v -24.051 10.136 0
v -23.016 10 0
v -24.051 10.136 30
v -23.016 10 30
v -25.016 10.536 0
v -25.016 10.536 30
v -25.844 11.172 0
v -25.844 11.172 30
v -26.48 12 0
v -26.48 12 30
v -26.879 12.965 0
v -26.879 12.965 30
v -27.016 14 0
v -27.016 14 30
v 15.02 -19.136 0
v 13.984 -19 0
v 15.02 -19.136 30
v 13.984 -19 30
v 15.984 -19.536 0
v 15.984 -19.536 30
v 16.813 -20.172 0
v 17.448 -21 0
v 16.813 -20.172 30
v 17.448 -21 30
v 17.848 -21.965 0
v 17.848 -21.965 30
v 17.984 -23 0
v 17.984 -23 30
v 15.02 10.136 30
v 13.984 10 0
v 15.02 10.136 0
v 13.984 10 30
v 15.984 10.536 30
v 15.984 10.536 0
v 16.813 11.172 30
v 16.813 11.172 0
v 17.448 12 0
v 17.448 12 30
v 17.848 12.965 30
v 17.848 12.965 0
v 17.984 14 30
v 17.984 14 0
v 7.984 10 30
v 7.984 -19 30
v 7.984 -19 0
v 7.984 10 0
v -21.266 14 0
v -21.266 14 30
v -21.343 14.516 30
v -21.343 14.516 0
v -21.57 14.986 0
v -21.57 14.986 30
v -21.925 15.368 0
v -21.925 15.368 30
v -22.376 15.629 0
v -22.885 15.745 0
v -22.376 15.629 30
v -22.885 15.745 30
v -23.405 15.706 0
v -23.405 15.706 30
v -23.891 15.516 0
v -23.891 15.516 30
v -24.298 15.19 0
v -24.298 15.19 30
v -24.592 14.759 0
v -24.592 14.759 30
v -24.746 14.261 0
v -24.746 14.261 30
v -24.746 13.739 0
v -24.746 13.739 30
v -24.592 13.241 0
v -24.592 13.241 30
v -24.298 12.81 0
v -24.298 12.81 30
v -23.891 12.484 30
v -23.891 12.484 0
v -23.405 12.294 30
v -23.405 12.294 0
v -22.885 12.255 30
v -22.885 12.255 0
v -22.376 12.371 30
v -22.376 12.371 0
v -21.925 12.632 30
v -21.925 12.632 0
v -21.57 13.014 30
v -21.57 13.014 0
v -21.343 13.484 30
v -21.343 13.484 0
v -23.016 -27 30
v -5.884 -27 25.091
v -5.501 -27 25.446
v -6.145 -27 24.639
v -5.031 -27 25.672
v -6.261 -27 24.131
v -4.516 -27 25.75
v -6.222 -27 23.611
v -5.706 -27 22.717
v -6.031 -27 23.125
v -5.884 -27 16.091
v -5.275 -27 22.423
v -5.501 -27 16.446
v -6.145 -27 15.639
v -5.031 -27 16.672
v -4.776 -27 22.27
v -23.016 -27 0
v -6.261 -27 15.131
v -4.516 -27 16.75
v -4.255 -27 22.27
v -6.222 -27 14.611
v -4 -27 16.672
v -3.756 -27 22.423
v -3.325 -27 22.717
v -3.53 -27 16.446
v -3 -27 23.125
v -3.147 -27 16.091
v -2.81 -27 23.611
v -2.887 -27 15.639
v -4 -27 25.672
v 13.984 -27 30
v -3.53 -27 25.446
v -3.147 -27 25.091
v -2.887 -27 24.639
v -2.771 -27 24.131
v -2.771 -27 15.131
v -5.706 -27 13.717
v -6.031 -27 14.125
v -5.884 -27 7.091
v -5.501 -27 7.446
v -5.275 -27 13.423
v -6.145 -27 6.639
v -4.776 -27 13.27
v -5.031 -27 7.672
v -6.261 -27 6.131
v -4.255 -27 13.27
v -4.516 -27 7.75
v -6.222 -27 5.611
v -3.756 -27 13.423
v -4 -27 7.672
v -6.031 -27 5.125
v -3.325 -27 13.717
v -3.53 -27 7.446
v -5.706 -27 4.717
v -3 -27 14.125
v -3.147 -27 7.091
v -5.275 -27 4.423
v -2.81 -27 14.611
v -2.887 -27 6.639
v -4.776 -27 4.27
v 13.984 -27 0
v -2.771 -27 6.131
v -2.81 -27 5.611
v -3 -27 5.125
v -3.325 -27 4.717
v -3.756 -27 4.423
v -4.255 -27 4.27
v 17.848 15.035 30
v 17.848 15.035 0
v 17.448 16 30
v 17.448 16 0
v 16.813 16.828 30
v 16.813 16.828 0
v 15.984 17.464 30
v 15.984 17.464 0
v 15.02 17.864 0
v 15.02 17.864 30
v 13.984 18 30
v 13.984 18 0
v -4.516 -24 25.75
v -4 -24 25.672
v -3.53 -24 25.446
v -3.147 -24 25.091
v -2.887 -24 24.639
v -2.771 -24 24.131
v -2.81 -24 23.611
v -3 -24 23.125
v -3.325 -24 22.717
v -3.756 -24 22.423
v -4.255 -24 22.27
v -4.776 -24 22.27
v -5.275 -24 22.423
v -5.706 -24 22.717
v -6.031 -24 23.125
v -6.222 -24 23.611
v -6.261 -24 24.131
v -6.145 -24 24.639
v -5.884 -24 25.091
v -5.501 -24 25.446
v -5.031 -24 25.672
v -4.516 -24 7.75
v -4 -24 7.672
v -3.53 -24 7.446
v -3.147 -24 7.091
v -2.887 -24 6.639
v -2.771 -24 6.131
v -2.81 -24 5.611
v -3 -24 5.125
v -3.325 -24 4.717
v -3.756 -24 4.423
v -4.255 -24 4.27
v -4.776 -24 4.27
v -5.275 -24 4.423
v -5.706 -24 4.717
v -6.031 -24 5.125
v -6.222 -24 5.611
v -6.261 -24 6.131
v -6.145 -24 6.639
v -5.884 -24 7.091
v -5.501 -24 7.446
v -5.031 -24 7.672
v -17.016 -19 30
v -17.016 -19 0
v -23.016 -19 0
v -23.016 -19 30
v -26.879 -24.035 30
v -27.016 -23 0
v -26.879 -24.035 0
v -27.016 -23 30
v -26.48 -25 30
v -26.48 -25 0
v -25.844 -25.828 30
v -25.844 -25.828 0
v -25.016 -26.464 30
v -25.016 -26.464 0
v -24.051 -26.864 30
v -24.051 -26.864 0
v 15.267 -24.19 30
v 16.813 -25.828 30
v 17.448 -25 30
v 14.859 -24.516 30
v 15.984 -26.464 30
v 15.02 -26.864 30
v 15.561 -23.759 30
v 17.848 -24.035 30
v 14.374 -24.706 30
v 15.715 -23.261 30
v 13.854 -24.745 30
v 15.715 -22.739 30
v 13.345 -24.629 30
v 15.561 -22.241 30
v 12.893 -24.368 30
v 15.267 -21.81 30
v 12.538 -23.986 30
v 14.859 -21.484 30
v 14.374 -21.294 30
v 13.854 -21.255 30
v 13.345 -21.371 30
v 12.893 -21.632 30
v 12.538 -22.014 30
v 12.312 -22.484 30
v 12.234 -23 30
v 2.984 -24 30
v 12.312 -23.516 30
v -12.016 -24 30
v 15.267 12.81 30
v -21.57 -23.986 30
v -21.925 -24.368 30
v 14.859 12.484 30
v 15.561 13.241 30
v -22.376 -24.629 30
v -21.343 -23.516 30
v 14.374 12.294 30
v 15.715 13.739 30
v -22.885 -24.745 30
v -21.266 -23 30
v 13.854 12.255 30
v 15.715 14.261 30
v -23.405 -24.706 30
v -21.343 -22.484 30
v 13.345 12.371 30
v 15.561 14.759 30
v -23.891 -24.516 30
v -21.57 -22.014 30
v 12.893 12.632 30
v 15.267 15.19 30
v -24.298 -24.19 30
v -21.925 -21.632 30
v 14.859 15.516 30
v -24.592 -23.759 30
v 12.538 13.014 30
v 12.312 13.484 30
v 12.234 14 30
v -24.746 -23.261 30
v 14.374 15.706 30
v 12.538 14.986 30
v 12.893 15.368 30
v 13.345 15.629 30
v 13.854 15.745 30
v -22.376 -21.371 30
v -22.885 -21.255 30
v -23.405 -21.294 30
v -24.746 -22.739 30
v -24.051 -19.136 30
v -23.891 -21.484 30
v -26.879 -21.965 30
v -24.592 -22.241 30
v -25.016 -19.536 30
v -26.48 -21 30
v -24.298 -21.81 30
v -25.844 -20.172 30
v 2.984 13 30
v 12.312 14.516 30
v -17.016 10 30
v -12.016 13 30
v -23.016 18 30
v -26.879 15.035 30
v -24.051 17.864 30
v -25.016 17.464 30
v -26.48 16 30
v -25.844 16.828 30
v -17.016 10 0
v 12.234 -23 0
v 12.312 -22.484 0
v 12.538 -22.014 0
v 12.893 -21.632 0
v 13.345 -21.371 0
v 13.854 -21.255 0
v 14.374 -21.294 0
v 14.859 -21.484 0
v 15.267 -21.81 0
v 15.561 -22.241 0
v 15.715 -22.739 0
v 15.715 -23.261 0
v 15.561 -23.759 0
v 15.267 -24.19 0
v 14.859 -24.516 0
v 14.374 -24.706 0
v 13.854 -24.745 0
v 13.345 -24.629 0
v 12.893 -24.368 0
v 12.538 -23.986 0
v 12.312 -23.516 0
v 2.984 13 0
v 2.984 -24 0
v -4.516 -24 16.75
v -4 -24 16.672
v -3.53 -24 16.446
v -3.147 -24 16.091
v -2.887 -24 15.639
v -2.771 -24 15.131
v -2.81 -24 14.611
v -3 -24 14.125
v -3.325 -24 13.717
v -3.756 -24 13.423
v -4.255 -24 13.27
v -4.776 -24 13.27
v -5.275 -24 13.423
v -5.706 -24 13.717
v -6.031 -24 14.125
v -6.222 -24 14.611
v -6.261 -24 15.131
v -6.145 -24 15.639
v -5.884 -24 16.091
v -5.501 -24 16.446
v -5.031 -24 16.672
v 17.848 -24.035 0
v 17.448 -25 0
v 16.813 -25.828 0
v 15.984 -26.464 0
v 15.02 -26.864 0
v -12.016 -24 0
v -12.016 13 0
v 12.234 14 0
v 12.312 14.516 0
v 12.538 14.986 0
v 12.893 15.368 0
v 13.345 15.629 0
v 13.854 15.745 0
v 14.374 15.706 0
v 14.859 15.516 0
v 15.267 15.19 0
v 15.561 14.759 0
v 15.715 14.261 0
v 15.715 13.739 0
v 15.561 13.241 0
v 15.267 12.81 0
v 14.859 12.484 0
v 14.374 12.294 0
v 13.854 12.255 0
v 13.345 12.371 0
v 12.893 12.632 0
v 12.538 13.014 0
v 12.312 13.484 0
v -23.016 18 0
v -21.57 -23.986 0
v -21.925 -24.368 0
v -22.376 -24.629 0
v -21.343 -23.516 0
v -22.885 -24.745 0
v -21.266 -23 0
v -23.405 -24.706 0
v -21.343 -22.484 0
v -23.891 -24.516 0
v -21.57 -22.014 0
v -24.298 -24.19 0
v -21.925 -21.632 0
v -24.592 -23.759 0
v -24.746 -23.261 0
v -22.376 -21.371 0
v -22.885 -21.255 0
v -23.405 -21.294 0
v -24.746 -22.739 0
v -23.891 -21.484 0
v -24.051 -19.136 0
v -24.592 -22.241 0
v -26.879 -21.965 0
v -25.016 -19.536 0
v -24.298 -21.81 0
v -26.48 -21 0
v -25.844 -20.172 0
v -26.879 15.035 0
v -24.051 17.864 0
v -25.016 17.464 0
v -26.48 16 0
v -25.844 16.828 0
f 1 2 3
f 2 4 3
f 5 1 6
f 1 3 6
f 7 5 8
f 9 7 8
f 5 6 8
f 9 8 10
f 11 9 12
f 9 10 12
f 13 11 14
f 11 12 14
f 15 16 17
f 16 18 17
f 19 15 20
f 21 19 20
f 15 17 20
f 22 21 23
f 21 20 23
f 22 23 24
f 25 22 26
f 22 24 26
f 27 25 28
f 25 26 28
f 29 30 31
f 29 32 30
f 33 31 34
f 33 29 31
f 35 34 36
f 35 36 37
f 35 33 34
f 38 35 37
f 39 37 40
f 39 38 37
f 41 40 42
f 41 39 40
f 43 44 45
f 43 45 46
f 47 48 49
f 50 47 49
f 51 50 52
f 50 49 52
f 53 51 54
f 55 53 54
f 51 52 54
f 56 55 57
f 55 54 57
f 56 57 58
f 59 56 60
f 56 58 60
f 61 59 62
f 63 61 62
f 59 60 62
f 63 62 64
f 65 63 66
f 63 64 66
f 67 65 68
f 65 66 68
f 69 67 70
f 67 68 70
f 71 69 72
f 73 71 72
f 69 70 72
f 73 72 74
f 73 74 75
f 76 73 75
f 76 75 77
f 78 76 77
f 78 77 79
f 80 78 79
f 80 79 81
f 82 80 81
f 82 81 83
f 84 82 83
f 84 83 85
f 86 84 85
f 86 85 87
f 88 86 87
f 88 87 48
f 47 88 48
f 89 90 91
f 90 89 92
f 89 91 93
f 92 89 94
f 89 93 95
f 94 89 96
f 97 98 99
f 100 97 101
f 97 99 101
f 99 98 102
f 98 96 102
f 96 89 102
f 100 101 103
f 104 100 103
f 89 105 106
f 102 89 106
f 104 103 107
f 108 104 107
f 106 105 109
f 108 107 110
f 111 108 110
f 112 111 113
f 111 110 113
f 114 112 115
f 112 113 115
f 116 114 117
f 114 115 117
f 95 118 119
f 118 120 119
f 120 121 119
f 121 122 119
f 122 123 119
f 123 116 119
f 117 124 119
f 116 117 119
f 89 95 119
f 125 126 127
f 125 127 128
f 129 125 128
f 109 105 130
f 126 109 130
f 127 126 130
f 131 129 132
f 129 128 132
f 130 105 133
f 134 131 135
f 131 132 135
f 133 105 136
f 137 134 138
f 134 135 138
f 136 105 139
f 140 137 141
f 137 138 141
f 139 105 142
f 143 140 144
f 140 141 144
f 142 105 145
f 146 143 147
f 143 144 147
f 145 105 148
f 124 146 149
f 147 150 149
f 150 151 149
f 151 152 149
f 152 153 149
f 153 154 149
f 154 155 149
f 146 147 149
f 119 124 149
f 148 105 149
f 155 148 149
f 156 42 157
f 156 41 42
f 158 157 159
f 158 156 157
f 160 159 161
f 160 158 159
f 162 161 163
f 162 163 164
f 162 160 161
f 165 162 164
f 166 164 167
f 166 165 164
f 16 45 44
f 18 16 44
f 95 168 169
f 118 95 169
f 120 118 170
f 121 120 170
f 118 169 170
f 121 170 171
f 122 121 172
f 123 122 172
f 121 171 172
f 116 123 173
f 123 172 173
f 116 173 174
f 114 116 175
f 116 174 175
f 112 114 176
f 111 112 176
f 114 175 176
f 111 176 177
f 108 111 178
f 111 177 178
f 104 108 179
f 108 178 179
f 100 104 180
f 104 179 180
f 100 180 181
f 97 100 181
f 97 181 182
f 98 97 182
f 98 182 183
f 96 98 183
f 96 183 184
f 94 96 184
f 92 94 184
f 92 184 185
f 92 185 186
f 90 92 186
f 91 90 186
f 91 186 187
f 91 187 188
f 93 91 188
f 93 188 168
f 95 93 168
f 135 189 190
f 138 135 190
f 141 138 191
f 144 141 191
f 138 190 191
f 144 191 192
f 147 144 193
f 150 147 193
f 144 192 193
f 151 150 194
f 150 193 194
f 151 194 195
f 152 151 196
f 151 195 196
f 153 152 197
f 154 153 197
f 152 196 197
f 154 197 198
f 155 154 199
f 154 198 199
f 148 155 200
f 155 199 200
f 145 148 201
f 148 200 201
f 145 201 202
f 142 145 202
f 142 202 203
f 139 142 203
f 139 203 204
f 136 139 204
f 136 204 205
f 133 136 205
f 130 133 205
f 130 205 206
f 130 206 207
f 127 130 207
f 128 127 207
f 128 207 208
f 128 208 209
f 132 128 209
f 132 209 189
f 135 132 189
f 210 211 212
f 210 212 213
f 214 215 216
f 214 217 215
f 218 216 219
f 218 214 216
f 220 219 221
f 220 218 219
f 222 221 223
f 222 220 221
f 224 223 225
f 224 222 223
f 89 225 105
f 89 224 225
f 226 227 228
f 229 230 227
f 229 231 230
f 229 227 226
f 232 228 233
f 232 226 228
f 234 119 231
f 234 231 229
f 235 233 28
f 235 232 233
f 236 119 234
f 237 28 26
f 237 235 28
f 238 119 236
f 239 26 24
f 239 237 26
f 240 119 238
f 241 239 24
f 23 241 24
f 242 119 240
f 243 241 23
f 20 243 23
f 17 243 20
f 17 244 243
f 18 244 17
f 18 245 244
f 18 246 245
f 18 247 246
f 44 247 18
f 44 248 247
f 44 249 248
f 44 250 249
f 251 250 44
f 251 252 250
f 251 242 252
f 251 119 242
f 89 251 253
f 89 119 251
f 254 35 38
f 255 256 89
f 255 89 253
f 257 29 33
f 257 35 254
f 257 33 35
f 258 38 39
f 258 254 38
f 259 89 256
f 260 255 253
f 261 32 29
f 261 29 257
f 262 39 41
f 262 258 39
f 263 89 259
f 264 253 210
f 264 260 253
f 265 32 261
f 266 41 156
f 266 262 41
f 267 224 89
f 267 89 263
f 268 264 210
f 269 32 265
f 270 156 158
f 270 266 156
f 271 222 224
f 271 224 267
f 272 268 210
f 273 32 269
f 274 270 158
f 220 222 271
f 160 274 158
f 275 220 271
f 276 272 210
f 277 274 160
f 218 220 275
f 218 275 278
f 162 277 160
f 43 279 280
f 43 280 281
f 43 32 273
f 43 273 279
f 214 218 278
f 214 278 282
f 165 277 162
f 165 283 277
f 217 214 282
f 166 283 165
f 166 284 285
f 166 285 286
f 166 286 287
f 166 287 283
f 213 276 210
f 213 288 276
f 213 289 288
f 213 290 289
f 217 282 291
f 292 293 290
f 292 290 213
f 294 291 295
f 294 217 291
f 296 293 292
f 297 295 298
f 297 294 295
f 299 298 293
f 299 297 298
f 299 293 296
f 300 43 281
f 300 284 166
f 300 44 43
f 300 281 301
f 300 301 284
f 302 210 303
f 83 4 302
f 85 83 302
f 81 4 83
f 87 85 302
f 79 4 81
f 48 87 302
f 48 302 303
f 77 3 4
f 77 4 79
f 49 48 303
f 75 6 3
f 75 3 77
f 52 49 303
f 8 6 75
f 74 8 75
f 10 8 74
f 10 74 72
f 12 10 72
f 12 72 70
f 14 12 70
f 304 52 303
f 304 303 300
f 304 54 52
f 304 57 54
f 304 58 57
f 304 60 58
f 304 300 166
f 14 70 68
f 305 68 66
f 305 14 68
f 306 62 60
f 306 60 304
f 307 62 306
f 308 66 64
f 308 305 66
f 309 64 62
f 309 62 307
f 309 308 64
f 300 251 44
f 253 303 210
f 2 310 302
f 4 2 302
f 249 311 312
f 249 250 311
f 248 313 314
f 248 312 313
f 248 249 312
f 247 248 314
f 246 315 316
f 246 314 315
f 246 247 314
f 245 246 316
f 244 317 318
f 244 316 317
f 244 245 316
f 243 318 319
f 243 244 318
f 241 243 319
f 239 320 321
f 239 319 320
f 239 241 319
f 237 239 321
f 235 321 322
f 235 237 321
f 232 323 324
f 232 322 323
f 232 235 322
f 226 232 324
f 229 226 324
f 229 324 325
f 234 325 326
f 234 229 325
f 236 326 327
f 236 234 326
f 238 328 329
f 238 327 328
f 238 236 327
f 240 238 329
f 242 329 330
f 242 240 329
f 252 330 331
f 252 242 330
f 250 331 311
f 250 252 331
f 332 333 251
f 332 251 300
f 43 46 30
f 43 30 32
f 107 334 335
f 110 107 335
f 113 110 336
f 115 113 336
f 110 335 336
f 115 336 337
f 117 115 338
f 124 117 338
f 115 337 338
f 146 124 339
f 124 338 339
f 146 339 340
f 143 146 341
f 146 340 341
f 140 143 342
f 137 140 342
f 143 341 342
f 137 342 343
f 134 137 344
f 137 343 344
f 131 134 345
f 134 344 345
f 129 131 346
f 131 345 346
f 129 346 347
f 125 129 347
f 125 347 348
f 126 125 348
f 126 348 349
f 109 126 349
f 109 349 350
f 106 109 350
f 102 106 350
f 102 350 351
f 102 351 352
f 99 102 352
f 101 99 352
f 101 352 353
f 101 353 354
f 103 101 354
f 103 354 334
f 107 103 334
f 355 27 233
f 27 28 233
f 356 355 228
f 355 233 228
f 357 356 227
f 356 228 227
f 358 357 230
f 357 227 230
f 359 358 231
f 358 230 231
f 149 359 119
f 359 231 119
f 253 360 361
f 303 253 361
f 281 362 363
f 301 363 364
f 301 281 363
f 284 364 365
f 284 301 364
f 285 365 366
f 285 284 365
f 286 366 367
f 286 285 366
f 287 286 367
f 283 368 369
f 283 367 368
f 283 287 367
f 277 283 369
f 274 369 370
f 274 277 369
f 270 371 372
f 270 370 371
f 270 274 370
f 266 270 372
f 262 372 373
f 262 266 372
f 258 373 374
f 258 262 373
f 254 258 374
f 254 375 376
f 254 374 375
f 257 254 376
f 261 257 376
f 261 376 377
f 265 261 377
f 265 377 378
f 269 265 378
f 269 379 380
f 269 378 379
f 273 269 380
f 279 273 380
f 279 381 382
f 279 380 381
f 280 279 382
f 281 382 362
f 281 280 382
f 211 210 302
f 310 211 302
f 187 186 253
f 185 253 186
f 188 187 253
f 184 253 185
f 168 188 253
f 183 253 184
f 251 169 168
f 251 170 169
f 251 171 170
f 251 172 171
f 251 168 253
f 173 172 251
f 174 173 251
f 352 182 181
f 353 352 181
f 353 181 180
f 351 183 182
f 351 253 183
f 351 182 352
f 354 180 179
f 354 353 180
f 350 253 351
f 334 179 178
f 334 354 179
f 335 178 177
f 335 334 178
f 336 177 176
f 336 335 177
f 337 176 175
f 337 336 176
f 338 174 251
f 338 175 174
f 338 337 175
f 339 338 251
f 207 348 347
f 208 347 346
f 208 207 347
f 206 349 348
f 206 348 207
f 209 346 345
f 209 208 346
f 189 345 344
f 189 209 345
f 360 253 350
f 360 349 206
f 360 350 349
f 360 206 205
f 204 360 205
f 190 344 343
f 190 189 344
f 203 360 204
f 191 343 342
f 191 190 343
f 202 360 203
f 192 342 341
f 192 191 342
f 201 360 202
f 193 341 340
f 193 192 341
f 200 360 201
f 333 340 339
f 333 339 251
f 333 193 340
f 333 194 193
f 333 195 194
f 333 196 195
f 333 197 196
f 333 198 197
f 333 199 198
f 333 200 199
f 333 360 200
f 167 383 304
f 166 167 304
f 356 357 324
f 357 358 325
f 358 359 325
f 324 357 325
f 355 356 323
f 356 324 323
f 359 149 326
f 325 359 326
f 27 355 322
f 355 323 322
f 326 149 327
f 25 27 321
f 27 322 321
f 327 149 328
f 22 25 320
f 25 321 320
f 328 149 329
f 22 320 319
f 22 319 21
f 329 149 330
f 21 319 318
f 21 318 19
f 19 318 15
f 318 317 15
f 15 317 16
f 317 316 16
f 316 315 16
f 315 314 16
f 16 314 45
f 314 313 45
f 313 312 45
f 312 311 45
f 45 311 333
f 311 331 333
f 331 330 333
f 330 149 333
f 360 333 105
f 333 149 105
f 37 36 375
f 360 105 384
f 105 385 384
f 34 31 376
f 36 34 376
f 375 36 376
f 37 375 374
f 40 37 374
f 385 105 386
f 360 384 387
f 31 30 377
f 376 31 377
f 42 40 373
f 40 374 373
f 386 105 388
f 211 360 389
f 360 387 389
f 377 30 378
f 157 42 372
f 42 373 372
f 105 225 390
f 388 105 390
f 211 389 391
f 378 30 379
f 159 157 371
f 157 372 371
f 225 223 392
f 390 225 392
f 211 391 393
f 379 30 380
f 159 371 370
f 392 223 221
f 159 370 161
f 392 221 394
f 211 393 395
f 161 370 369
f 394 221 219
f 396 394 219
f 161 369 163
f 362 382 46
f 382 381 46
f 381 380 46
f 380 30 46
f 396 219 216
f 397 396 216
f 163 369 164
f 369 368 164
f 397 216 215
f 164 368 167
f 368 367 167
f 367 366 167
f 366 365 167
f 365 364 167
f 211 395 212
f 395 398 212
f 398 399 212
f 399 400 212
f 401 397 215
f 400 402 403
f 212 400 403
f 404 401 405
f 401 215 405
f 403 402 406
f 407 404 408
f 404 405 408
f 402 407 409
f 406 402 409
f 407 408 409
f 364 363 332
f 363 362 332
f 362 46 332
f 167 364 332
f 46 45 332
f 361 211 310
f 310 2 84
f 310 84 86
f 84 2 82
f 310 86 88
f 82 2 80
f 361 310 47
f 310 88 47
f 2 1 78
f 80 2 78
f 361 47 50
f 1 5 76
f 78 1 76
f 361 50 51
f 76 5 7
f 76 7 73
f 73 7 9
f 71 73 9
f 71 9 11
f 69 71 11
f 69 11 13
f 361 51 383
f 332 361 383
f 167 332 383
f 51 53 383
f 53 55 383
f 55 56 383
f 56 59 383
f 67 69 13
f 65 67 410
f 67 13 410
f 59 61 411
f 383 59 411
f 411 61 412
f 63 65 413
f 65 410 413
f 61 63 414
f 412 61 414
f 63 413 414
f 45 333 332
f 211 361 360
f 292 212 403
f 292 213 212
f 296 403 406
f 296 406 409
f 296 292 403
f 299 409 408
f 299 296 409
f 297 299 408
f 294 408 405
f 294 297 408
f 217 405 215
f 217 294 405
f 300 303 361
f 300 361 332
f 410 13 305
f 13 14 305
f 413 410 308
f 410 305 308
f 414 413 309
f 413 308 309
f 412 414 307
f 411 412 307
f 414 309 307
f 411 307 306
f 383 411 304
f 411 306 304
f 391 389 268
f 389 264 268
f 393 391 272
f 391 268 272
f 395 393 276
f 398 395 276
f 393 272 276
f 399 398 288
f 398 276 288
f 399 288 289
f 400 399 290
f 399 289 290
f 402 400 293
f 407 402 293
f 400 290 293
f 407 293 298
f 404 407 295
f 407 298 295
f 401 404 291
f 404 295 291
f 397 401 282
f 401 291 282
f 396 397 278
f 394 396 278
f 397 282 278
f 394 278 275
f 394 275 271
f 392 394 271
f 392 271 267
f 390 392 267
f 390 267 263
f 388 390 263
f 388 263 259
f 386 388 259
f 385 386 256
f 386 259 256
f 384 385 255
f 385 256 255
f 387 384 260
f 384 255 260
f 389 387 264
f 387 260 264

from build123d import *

# Parameters (mm, degrees)
CROQUIS3_W               = 25
CROQUIS3_H               = 45
CROQUIS3_W_2             = 15
CROQUIS3_H_2             = 37
SALIENTE_EXTRUIR1_DEPTH  = 30
CROQUIS4_W               = 30
CROQUIS4_H               = 8
SALIENTE_EXTRUIR2_DEPTH  = 10
CROQUIS5_R               = 1.75
CORTAR_EXTRUIR1_DEPTH    = 49.567948266
REDONDEO1_R              = 4
REDONDEO1_OF_SIMETR_A1_R = 4
CROQUIS7_R               = 1.75
CORTAR_EXTRUIR2_DEPTH    = 59.25672149


with BuildPart() as part:
    # Croquis3 → Saliente-Extruir1 (new body)
    with BuildSketch(Plane.XY):
        with Locations((-4.515654699, -4.5)):
            Rectangle(CROQUIS3_W, CROQUIS3_H)
        with Locations((-4.515654699, -5.5)):
            Rectangle(CROQUIS3_W_2, CROQUIS3_H_2, mode=Mode.SUBTRACT)
    extrude(amount=SALIENTE_EXTRUIR1_DEPTH)

    # Croquis4 → Saliente-Extruir2 (add)
    with BuildSketch(Plane.ZY.offset(17.015654699)):
        with Locations((15, 14)):
            Rectangle(CROQUIS4_W, CROQUIS4_H)
        with Locations((15, -23)):
            Rectangle(CROQUIS4_W, CROQUIS4_H)
    saliente_extruir2 = extrude(amount=SALIENTE_EXTRUIR2_DEPTH)

    # Croquis5 → Cortar-Extruir1 (cut, symmetric)
    with BuildSketch(Plane.XY.offset(30)):
        with Locations((-23.015654699, 14)):
            Circle(CROQUIS5_R)
        with Locations((-23.015654699, -23)):
            Circle(CROQUIS5_R)
    cortar_extruir1 = extrude(amount=CORTAR_EXTRUIR1_DEPTH, both=True, mode=Mode.SUBTRACT)

    # Redondeo1
    redondeo1_edges = [part.edges().sort_by_distance(p)[0] for p in [
        (-27.015654699, -27, 15),
        (-27.015654699, -19, 15),
        (-27.015654699, 10, 15),
        (-27.015654699, 18, 15),
    ]]
    fillet(redondeo1_edges, radius=REDONDEO1_R - 0.0001)  # a hair under: the kernel refuses the full size

    # Simetría1: Saliente-Extruir2, Cortar-Extruir1 across plane
    add(saliente_extruir2.mirror(Plane.ZY.offset(4.515654699)))
    add(cortar_extruir1.mirror(Plane.ZY.offset(4.515654699)), mode=Mode.SUBTRACT)

    # Redondeo1 of Simetría1
    redondeo1_of_simetr_a1_edges = [part.edges().sort_by_distance(p)[0] for p in [
        (17.984345301, -27, 15),
        (17.984345301, -19, 15),
        (17.984345301, 10, 15),
        (17.984345301, 18, 15),
    ]]
    fillet(redondeo1_of_simetr_a1_edges, radius=REDONDEO1_OF_SIMETR_A1_R - 0.0001)  # a hair under: the kernel refuses the full size

    # Croquis7 → Cortar-Extruir2 (cut, through all)
    with BuildSketch(Plane(origin=(0, -24, 0), x_dir=(1, 0, 0), z_dir=(0, 1, 0))):
        with Locations(Location((-4.515654699, -24, 0), (0, 0, 270))):
            Circle(CROQUIS7_R)
        with Locations(Location((-4.515654699, -15, 0), (0, 0, 270))):
            Circle(CROQUIS7_R)
        with Locations(Location((-4.515654699, -6, 0), (0, 0, 270))):
            Circle(CROQUIS7_R)
    extrude(amount=-CORTAR_EXTRUIR2_DEPTH, mode=Mode.SUBTRACT)


solid = part.part
